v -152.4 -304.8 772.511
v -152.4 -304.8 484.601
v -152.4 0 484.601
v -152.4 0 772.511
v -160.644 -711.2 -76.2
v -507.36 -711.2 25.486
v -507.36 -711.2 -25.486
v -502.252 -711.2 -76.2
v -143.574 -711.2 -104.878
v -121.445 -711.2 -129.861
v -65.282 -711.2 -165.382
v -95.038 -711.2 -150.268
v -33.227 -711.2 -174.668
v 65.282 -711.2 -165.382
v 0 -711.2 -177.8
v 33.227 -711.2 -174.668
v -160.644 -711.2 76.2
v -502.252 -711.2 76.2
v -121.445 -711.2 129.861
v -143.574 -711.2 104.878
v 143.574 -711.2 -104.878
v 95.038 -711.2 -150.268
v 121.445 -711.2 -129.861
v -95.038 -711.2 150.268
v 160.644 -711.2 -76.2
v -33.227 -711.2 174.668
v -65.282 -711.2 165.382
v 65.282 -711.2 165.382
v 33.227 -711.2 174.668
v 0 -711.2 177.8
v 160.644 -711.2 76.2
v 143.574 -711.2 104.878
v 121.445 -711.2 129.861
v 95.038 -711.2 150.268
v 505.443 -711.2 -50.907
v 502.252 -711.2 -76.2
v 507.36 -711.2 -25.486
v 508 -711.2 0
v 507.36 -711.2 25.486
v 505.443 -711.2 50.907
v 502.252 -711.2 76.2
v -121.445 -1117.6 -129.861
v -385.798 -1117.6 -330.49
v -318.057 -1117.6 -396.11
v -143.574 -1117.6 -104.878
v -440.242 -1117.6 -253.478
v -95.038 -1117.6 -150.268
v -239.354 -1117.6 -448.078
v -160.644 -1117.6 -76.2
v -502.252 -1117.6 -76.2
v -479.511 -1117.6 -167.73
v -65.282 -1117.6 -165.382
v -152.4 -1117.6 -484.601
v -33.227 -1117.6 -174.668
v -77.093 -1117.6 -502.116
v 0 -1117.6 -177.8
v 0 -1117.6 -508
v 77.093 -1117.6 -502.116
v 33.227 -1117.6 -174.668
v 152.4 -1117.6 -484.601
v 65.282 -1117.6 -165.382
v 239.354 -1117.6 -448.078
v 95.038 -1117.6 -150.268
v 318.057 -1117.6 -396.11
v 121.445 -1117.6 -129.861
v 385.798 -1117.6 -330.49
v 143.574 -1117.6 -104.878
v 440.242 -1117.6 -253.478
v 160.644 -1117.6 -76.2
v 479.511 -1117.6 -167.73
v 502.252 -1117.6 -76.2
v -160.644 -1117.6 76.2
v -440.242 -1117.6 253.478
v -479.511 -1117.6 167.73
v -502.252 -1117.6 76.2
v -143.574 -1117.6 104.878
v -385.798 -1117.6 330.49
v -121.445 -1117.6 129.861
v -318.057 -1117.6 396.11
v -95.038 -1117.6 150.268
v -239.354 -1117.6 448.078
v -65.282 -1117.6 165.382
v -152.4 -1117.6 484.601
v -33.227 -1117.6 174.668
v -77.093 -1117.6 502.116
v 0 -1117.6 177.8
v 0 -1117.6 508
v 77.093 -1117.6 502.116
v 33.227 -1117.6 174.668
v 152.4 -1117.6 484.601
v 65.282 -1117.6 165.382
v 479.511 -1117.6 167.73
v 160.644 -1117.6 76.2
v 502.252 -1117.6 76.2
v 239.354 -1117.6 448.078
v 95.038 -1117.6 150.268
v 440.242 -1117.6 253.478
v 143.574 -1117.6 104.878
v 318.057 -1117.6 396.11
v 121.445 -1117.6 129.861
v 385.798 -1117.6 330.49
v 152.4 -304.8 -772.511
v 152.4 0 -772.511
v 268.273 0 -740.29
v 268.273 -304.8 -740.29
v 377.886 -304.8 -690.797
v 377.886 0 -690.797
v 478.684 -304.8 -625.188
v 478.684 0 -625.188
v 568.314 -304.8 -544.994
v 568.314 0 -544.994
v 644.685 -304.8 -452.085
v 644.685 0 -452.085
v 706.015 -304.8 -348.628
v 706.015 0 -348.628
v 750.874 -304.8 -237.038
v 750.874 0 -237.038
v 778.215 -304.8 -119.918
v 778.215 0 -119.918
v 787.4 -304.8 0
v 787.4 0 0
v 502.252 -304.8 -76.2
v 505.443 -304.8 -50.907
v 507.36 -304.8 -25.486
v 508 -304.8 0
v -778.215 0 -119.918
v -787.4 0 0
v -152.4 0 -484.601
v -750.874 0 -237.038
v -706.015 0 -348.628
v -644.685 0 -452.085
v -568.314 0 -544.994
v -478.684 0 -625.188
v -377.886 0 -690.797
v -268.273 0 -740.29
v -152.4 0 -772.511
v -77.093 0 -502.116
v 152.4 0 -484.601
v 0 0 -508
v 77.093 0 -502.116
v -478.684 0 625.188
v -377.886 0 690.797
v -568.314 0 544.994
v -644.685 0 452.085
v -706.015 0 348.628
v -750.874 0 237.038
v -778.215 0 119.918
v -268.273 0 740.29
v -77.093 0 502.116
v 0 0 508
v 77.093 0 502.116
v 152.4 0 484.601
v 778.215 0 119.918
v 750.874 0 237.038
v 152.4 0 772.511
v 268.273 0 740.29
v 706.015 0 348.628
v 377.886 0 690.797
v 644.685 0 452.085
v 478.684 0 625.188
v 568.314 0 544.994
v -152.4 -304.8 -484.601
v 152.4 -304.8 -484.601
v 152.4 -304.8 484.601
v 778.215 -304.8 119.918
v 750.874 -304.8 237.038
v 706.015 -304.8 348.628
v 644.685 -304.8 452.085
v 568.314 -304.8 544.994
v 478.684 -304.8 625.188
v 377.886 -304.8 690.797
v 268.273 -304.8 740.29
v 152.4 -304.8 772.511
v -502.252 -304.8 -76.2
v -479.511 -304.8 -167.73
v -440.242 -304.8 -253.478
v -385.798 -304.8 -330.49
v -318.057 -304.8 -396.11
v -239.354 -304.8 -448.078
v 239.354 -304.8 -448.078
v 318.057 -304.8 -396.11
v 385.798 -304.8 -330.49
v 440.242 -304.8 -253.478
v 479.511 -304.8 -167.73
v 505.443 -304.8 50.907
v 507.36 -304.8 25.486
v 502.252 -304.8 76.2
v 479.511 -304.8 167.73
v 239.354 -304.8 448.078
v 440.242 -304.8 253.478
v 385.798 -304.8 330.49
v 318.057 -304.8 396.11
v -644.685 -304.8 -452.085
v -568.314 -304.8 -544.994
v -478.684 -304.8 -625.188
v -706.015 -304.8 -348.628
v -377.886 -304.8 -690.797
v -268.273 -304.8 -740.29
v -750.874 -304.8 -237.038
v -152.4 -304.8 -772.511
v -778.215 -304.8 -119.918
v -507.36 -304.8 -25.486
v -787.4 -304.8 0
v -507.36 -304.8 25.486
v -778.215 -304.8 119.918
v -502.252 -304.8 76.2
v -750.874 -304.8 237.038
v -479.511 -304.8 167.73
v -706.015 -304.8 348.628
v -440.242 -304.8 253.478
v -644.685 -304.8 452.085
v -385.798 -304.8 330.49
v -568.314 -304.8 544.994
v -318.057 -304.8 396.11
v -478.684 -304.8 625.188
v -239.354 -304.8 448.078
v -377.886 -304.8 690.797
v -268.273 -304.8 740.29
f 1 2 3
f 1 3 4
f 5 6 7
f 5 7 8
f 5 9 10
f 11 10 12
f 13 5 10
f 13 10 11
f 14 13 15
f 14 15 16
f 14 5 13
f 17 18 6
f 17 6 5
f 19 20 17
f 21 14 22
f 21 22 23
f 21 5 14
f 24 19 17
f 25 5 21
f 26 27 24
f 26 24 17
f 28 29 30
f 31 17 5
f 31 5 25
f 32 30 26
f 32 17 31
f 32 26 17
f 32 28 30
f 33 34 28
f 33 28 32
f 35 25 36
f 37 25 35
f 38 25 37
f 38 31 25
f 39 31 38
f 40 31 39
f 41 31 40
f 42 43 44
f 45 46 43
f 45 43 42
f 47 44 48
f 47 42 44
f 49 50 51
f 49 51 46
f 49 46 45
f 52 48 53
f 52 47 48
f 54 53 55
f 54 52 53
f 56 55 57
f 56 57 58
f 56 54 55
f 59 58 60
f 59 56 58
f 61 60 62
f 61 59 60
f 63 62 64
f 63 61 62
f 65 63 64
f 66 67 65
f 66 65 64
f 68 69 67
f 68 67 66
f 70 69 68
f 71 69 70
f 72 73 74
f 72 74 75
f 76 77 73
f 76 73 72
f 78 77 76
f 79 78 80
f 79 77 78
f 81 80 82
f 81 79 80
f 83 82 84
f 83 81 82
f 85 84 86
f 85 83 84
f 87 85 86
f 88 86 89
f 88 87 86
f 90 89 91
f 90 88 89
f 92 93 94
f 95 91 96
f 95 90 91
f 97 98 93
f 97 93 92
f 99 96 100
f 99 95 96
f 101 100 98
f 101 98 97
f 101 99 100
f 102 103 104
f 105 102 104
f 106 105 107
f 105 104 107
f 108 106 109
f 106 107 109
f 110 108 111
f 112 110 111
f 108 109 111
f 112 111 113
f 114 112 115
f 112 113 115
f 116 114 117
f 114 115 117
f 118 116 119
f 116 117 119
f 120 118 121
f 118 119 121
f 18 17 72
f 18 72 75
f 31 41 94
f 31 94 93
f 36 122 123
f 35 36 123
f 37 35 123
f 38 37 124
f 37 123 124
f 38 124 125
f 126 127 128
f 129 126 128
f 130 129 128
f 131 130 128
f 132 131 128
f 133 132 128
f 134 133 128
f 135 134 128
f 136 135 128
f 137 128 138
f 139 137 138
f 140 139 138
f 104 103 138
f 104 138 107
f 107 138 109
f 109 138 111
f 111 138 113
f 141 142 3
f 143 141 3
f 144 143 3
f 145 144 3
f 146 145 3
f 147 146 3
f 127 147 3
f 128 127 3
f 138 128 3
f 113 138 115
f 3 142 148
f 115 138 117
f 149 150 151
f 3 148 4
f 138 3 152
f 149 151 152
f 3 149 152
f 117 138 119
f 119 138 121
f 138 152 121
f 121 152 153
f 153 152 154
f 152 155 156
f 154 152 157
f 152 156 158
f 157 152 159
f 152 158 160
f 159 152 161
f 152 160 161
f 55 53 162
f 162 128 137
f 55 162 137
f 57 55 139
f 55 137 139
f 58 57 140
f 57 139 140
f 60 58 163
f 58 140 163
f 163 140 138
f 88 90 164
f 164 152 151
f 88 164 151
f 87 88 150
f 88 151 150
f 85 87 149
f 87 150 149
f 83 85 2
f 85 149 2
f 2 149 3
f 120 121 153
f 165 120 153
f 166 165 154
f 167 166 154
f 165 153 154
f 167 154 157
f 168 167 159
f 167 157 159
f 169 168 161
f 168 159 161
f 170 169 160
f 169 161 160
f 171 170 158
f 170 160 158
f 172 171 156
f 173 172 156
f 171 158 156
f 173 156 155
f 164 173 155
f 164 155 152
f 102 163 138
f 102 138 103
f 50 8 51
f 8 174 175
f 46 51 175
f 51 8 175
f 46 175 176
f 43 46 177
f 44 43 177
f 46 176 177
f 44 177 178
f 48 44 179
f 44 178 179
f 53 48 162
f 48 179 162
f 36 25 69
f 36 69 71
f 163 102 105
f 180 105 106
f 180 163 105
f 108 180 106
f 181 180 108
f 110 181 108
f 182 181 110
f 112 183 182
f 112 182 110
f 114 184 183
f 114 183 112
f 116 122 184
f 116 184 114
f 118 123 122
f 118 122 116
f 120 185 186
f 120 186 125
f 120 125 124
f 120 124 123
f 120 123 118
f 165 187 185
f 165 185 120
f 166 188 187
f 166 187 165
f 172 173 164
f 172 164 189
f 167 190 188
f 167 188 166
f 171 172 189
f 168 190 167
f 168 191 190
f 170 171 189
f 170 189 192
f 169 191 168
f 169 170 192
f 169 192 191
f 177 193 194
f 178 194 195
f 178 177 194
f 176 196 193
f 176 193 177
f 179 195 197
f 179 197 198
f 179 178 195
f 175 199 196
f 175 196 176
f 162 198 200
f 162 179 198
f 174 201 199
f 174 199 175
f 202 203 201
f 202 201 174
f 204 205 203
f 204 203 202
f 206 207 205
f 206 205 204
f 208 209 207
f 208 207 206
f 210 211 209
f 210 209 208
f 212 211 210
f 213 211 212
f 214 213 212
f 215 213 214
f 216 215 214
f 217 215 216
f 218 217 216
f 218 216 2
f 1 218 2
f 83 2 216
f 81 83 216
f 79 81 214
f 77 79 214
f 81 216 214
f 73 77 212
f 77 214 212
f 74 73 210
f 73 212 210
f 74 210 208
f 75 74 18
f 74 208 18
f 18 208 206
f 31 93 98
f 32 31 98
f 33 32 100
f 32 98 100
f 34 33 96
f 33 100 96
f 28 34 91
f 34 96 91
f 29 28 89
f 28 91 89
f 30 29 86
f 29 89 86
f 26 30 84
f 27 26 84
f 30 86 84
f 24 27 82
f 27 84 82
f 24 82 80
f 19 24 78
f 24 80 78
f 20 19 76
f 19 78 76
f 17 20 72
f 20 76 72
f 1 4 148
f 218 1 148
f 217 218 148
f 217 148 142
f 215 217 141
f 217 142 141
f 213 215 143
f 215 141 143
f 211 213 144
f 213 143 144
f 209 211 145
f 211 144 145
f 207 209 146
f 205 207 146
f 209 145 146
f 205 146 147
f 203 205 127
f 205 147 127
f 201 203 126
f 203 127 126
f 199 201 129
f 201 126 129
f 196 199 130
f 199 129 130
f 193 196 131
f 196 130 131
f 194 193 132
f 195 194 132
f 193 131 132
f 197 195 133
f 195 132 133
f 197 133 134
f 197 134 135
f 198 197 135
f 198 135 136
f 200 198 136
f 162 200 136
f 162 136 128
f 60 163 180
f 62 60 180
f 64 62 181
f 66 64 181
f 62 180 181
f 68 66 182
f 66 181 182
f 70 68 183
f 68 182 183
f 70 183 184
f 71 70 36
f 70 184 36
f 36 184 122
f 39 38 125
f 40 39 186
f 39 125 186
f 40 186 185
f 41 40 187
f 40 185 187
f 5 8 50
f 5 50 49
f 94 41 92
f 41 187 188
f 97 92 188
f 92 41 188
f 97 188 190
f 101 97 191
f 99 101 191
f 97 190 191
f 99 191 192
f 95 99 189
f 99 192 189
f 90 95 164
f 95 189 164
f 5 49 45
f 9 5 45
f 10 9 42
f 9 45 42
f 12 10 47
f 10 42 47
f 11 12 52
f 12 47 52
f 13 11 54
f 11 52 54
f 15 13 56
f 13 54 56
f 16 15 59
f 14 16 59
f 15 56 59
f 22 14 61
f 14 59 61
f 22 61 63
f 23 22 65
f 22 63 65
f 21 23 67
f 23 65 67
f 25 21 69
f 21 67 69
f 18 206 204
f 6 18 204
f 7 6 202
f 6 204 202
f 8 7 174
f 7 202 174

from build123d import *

# Parameters (mm, degrees)
F1_DEPTH = 1117.6
F2_DEPTH = 304.8
F4_DEPTH = 406.4


with BuildPart() as f1:
    # F0 (on Front) → F1 (new body)
    with BuildSketch(Plane.XZ):
        with BuildLine():
            ThreePointArc((502.252486, 76.2), (385.798311, 330.490035), (152.4, 484.601114))
            ThreePointArc((152.4, 484.601114), (0, 508), (-152.4, 484.601114))
            ThreePointArc((-152.4, 484.601114), (-385.798311, 330.490035), (-502.252486, 76.2))
            Line((-502.252486, 76.2), (-160.643705, 76.2))
            ThreePointArc((-160.643705, 76.2), (0, 177.8), (160.643705, 76.2))
            Line((160.643705, 76.2), (502.252486, 76.2))
        make_face()
        with BuildLine():
            Line((-160.643705, 76.2), (-502.252486, 76.2))
            ThreePointArc((-502.252486, 76.2), (-508, 0), (-502.252486, -76.2))
            Line((-502.252486, -76.2), (-160.643705, -76.2))
            ThreePointArc((-160.643705, -76.2), (-177.8, 0), (-160.643705, 76.2))
        make_face()
        with BuildLine():
            ThreePointArc((177.8, 0), (173.457907, 39.05374), (160.643705, 76.2))
            ThreePointArc((160.643705, 76.2), (0, 177.8), (-160.643705, 76.2))
            ThreePointArc((-160.643705, 76.2), (-177.8, 0), (-160.643705, -76.2))
            ThreePointArc((-160.643705, -76.2), (0, -177.8), (160.643705, -76.2))
            ThreePointArc((160.643705, -76.2), (173.457907, -39.05374), (177.8, 0))
        make_face()
        with BuildLine():
            ThreePointArc((508, 0), (506.561084, 38.208225), (502.252486, 76.2))
            Line((502.252486, 76.2), (160.643705, 76.2))
            ThreePointArc((160.643705, 76.2), (173.457907, 39.05374), (177.8, 0))
            ThreePointArc((177.8, 0), (173.457907, -39.05374), (160.643705, -76.2))
            Line((160.643705, -76.2), (502.252486, -76.2))
            ThreePointArc((502.252486, -76.2), (506.561084, -38.208225), (508, 0))
        make_face()
        with BuildLine():
            ThreePointArc((-152.4, -484.601114), (0, -508), (152.4, -484.601114))
            ThreePointArc((152.4, -484.601114), (385.798311, -330.490035), (502.252486, -76.2))
            Line((502.252486, -76.2), (160.643705, -76.2))
            ThreePointArc((160.643705, -76.2), (0, -177.8), (-160.643705, -76.2))
            Line((-160.643705, -76.2), (-502.252486, -76.2))
            ThreePointArc((-502.252486, -76.2), (-385.798311, -330.490035), (-152.4, -484.601114))
        make_face()
    extrude(amount=F1_DEPTH)

    # F0 (on Front) → F2 (join)
    with BuildSketch(Plane.XZ):
        with BuildLine():
            Line((-152.4, 484.601114), (-152.4, 772.510841))
            ThreePointArc((-152.4, 772.510841), (-787.4, 0), (-152.4, -772.510841))
            Line((-152.4, -772.510841), (-152.4, -484.601114))
            ThreePointArc((-152.4, -484.601114), (-385.798311, -330.490035), (-502.252486, -76.2))
            ThreePointArc((-502.252486, -76.2), (-508, 0), (-502.252486, 76.2))
            ThreePointArc((-502.252486, 76.2), (-385.798311, 330.490035), (-152.4, 484.601114))
        make_face()
        with BuildLine():
            ThreePointArc((152.4, -772.510841), (608.275645, -499.9995), (787.4, 0))
            ThreePointArc((787.4, 0), (608.275645, 499.9995), (152.4, 772.510841))
            Line((152.4, 772.510841), (152.4, 484.601114))
            ThreePointArc((152.4, 484.601114), (385.798311, 330.490035), (502.252486, 76.2))
            ThreePointArc((502.252486, 76.2), (506.561084, 38.208225), (508, 0))
            ThreePointArc((508, 0), (506.561084, -38.208225), (502.252486, -76.2))
            ThreePointArc((502.252486, -76.2), (385.798311, -330.490035), (152.4, -484.601114))
            Line((152.4, -484.601114), (152.4, -772.510841))
        make_face()
    extrude(amount=F2_DEPTH)

    # F3 (on face) → F4 (cut)
    with BuildSketch(Plane.XZ.offset(1117.6)):
        with BuildLine():
            ThreePointArc((-160.643705, -76.2), (-177.8, 0), (-160.643705, 76.2))
            Line((-160.643705, 76.2), (-502.252486, 76.2))
            ThreePointArc((-502.252486, 76.2), (-508, 0), (-502.252486, -76.2))
            Line((-502.252486, -76.2), (-160.643705, -76.2))
        make_face()
        with BuildLine():
            ThreePointArc((160.643705, -76.2), (173.457907, -39.05374), (177.8, 0))
            ThreePointArc((177.8, 0), (173.457907, 39.05374), (160.643705, 76.2))
            ThreePointArc((160.643705, 76.2), (0, 177.8), (-160.643705, 76.2))
            ThreePointArc((-160.643705, 76.2), (-177.8, 0), (-160.643705, -76.2))
            ThreePointArc((-160.643705, -76.2), (0, -177.8), (160.643705, -76.2))
        make_face()
        with BuildLine():
            ThreePointArc((160.643705, 76.2), (173.457907, 39.05374), (177.8, 0))
            ThreePointArc((177.8, 0), (173.457907, -39.05374), (160.643705, -76.2))
            Line((160.643705, -76.2), (502.252486, -76.2))
            ThreePointArc((502.252486, -76.2), (506.561084, -38.208225), (508, 0))
            ThreePointArc((508, 0), (506.561084, 38.208225), (502.252486, 76.2))
            Line((502.252486, 76.2), (160.643705, 76.2))
        make_face()
    extrude(amount=-F4_DEPTH, mode=Mode.SUBTRACT)


solid = f1.part
